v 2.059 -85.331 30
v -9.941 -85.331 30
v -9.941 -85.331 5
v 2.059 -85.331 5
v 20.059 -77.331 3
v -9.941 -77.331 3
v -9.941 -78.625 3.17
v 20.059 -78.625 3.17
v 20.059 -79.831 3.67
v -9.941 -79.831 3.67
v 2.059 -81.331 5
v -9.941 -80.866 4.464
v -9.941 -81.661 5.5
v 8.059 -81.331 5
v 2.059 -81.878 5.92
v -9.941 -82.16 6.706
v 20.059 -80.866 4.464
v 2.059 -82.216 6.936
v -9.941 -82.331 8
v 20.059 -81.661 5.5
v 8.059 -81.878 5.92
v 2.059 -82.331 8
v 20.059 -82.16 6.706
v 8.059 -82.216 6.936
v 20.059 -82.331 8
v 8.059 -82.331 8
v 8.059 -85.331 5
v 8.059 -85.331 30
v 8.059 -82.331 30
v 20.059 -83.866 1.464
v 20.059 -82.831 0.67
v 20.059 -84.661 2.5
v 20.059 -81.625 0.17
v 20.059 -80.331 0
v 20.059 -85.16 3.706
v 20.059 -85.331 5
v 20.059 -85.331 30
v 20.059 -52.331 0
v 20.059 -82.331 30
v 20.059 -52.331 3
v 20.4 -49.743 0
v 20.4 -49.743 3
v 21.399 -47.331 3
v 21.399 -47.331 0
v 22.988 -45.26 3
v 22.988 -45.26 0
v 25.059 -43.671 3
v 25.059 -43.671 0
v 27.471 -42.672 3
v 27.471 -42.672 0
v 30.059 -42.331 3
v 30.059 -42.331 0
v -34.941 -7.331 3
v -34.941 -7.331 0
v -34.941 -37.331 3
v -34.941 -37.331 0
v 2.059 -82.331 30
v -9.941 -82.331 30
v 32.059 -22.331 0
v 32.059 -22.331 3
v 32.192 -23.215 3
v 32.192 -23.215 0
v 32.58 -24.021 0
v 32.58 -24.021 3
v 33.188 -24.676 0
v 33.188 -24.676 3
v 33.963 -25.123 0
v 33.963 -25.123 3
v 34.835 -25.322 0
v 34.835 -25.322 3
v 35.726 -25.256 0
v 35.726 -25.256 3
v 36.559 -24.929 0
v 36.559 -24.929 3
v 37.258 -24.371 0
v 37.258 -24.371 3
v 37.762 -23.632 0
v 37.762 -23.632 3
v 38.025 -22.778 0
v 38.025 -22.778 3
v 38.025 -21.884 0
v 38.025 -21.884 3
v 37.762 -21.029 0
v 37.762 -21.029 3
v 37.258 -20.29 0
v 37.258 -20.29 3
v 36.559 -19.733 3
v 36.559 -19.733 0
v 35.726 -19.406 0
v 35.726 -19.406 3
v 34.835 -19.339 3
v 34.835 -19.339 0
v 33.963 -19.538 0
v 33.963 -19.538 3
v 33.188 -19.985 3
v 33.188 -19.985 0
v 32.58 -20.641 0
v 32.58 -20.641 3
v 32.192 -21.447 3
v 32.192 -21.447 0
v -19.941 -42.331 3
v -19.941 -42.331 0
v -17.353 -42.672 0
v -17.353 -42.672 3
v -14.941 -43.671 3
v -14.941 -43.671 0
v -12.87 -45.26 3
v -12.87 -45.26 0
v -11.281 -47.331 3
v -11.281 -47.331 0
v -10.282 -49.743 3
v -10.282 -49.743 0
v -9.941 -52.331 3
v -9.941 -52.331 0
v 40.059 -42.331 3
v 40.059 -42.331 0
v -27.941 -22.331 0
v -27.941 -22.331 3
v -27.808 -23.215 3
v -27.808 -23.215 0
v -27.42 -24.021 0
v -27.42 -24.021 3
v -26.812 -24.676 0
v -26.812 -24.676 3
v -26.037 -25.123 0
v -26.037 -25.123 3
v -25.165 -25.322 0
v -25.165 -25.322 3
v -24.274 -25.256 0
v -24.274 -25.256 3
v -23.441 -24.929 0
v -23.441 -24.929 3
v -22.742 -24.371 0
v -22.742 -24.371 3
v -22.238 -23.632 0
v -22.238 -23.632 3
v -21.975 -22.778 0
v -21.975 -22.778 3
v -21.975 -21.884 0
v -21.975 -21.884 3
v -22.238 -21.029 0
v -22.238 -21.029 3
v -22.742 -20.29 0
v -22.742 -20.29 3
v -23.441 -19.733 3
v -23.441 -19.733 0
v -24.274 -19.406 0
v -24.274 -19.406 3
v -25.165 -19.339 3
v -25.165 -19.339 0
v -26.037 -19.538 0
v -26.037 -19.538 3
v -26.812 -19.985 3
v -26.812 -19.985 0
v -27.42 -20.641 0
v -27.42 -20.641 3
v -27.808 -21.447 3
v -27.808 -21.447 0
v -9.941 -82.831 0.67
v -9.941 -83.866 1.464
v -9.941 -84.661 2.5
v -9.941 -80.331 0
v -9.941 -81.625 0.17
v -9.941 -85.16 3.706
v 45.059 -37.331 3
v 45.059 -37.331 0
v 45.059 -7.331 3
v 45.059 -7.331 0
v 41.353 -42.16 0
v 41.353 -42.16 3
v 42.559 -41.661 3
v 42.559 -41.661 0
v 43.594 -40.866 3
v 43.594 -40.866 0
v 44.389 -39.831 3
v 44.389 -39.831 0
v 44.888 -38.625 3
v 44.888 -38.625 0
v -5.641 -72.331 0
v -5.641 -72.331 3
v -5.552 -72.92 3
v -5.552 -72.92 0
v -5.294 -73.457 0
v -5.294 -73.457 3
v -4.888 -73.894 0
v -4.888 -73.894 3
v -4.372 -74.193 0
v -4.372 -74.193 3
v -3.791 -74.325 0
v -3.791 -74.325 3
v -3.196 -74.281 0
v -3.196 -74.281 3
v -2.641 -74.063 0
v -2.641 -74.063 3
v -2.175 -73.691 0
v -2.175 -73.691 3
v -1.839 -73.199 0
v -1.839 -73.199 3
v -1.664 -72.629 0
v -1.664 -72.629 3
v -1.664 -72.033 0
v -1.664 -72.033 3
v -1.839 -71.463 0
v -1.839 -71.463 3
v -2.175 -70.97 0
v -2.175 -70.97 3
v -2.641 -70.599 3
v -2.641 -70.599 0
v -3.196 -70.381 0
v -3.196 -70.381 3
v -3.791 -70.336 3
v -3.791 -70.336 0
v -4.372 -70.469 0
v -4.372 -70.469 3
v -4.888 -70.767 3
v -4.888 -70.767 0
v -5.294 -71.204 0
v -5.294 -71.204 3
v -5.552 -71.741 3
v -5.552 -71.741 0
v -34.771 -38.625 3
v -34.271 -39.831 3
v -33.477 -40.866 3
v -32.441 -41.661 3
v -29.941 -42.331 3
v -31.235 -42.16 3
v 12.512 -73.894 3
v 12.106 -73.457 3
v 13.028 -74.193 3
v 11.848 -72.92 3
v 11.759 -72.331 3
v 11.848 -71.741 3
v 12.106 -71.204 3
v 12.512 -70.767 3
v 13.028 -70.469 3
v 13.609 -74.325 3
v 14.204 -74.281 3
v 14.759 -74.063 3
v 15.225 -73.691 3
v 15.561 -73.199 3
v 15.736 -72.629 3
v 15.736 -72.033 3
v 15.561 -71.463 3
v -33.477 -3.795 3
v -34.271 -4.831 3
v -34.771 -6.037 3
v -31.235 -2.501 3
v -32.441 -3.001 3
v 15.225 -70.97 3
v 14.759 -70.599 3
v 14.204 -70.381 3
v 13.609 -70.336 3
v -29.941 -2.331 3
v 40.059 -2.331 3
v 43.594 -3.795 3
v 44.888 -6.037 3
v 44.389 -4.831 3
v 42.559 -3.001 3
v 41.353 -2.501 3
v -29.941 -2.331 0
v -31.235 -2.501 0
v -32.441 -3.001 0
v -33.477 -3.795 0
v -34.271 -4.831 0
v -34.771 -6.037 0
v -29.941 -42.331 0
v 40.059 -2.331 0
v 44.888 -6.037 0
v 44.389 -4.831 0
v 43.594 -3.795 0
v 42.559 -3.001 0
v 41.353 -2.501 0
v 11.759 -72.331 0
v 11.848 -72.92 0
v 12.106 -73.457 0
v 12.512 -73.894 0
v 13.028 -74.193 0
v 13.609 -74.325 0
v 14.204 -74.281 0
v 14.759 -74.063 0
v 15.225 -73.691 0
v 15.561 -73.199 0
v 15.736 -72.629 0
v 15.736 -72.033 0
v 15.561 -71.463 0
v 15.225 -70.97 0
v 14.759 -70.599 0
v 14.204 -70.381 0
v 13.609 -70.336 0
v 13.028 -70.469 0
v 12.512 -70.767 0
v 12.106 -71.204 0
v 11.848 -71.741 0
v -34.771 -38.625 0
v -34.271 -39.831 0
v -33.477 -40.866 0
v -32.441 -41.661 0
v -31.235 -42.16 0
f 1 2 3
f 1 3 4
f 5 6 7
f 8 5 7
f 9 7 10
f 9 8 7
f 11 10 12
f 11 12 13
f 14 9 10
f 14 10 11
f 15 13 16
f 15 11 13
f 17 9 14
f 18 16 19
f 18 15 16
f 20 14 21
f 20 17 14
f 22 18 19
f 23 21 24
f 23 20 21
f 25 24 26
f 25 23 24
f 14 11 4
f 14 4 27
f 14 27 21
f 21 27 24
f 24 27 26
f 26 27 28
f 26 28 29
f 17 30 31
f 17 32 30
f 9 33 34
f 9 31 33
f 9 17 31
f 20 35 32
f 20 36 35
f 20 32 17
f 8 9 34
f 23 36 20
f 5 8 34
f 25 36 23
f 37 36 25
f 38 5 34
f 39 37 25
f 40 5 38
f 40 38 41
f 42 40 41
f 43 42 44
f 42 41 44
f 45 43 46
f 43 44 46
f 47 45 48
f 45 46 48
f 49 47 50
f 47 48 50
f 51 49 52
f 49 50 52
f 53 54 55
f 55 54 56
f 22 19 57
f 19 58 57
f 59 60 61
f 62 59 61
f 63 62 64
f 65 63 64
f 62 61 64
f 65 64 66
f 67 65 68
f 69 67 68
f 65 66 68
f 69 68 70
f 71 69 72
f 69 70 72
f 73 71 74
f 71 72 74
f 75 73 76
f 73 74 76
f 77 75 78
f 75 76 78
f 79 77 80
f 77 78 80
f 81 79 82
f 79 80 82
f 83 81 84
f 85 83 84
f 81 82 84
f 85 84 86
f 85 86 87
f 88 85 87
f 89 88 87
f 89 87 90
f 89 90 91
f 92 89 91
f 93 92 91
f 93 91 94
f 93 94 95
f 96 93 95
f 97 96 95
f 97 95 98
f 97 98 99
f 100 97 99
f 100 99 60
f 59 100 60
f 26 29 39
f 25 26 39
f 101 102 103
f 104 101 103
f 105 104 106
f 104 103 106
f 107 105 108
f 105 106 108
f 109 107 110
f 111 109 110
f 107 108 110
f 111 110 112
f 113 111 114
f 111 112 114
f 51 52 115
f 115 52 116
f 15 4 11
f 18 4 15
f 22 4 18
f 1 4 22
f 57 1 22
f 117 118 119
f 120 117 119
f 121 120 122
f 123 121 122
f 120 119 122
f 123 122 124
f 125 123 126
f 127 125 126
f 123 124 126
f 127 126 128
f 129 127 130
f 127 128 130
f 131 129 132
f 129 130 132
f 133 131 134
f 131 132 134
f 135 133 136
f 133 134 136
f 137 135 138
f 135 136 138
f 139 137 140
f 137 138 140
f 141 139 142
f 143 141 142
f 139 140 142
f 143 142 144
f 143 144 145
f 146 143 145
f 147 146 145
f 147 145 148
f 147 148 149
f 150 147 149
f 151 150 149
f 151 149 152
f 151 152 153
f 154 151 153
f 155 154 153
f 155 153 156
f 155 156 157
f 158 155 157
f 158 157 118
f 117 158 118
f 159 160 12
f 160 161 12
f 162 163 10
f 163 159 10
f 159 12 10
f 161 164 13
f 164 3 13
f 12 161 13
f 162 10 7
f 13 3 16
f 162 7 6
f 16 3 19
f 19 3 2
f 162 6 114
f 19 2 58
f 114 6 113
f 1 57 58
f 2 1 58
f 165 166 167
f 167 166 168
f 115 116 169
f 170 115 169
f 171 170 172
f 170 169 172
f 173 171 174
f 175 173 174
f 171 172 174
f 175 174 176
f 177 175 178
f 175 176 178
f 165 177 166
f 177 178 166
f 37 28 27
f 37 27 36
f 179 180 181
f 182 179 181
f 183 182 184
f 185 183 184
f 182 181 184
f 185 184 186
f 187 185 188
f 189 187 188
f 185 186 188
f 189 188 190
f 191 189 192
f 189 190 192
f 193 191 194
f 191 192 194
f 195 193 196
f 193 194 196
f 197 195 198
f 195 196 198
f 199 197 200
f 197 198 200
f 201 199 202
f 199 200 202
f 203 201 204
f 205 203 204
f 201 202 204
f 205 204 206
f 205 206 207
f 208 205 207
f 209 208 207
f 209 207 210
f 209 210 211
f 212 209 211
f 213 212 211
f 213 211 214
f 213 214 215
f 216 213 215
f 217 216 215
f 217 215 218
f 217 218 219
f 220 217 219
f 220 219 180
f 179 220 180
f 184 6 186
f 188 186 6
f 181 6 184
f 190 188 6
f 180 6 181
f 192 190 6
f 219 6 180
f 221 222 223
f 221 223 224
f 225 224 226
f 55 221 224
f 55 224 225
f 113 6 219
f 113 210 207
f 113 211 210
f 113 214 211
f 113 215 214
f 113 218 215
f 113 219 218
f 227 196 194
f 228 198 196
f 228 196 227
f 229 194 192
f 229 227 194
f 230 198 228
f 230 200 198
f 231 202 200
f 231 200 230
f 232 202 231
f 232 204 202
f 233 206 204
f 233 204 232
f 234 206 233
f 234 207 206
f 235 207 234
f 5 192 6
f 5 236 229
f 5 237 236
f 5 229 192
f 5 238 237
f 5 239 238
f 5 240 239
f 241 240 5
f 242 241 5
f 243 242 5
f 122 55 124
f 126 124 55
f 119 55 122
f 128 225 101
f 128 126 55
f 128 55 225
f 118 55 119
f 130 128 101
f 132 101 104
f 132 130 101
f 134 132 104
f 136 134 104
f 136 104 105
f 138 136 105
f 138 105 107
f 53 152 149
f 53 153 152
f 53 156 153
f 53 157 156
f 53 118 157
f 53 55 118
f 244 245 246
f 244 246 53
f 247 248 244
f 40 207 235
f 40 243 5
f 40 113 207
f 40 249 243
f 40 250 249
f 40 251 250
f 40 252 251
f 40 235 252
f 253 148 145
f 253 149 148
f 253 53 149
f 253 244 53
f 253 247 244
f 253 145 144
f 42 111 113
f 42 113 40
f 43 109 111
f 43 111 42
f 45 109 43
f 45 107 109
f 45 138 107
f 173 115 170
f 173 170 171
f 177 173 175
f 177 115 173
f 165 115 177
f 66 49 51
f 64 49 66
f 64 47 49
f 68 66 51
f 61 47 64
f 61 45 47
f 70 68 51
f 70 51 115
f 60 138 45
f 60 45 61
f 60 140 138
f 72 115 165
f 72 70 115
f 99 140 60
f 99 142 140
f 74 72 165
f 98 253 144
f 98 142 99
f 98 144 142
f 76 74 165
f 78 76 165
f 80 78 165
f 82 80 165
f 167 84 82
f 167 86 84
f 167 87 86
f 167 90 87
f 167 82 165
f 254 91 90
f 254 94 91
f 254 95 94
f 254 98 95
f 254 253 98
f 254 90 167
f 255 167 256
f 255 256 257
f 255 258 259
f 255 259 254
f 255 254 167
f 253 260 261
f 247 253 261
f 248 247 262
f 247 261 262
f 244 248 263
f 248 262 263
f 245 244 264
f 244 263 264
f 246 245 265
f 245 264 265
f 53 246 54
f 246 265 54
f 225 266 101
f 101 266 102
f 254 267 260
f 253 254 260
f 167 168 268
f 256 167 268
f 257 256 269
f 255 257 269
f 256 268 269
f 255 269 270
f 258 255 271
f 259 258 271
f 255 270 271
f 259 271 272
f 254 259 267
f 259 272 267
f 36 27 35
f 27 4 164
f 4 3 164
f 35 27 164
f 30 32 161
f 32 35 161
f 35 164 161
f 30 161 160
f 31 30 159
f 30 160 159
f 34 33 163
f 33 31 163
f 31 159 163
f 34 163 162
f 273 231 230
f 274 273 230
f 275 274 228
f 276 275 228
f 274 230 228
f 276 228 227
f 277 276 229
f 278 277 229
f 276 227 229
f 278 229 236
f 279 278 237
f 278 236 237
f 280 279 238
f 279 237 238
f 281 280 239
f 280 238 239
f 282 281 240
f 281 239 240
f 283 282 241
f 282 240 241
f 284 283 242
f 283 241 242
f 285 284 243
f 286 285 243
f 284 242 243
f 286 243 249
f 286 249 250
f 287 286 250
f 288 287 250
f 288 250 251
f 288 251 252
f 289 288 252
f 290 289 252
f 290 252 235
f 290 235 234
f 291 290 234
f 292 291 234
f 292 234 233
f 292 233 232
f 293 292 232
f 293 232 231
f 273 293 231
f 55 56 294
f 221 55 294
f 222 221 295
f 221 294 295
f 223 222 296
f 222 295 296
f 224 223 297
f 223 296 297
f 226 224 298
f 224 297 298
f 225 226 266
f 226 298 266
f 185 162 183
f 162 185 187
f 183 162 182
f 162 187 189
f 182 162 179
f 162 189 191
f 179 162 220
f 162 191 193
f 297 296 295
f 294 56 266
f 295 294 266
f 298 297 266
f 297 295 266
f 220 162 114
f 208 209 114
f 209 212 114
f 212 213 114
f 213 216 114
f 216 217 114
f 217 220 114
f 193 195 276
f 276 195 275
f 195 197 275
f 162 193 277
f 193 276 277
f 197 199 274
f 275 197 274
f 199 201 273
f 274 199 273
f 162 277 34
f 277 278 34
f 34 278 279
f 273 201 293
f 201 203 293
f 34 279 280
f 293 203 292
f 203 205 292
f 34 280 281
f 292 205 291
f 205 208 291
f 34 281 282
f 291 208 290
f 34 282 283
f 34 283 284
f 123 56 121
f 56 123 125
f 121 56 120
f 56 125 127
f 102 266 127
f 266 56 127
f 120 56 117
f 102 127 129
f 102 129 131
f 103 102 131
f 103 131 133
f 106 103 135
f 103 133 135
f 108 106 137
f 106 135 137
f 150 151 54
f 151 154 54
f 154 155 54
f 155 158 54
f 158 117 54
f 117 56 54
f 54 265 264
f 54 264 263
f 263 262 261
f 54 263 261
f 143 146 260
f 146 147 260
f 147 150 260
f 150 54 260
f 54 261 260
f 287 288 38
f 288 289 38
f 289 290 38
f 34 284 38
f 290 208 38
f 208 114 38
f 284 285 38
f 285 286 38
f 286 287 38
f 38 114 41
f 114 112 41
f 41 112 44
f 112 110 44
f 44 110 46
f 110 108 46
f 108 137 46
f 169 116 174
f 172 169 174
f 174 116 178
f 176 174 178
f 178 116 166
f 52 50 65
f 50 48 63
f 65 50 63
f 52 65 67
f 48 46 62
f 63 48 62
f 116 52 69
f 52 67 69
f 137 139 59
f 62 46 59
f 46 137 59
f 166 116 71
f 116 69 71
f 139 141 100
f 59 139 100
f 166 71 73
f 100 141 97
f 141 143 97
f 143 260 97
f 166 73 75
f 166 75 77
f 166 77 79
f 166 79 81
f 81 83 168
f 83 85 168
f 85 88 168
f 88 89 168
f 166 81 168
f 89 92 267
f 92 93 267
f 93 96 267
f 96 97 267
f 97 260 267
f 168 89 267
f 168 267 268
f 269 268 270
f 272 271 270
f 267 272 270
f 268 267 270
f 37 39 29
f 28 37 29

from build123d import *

# Parameters (mm, degrees)
F1_DEPTH     = 3
F2_D         = 4
F3_D         = 6
F5_W         = 30
F5_H         = 3
F6_DEPTH     = 3
F7_T4_DEPTH  = 30
F7_T10_DEPTH = 30
F7_T16_DEPTH = 30
F7_T23_DEPTH = 30
F7_T29_DEPTH = 30
F7_T32_DEPTH = 55


# Not quite as in the source:
# - a fillet or chamfer that OpenCascade refuses, or shapes differently, is made with other operations: its cross-section is extruded or revolved along the edge and cut away or added


with BuildPart() as f1:
    # F0 (on Top) → F1 (new body)
    with BuildSketch(Plane.XY):
        with BuildLine():
            Line((40.0588317961, -2.3308048306), (-29.9411682039, -2.3308048306))
            ThreePointArc((-29.9411682039, -2.3308048306), (-33.4767021099, -3.7952709247), (-34.9411682039, -7.3308048306))
            Line((-34.9411682039, -7.3308048306), (-34.9411682039, -37.3308048306))
            ThreePointArc((-34.9411682039, -37.3308048306), (-33.4767021099, -40.8663387365), (-29.9411682039, -42.3308048306))
            Line((-29.9411682039, -42.3308048306), (-19.9411682039, -42.3308048306))
            ThreePointArc((-19.9411682039, -42.3308048306), (-12.8701003921, -45.2597370187), (-9.9411682039, -52.3308048306))
            Line((-9.9411682039, -52.3308048306), (-9.9411682039, -82.3308048306))
            Line((-9.9411682039, -82.3308048306), (5.0588317961, -82.3308048306))
            Line((5.0588317961, -82.3308048306), (20.0588317961, -82.3308048306))
            Line((20.0588317961, -82.3308048306), (20.0588317961, -52.3308048306))
            ThreePointArc((20.0588317961, -52.3308048306), (22.9877639842, -45.2597370187), (30.0588317961, -42.3308048306))
            Line((30.0588317961, -42.3308048306), (40.0588317961, -42.3308048306))
            ThreePointArc((40.0588317961, -42.3308048306), (43.594365702, -40.8663387365), (45.0588317961, -37.3308048306))
            Line((45.0588317961, -37.3308048306), (45.0588317961, -7.3308048306))
            ThreePointArc((45.0588317961, -7.3308048306), (43.594365702, -3.7952709247), (40.0588317961, -2.3308048306))
        make_face()
    extrude(amount=F1_DEPTH)

    # F2 (through all)
    with Locations(Plane(origin=(0, 0, 0), x_dir=(1, 0, 0), z_dir=(0, 0, -1))):
        with Locations((-3.6411682039, 72.3308048306), (13.7588317961, 72.3308048306)):
            Hole(F2_D / 2)

    # F3 (through all)
    with Locations(Plane(origin=(0, 0, 0), x_dir=(1, 0, 0), z_dir=(0, 0, -1))):
        with Locations((-24.9411682039, 22.3308048306), (35.0588317961, 22.3308048306)):
            Hole(F3_D / 2)

    # F5 (on face) → F6 (join)
    with BuildSketch(Plane.XZ.offset(82.3308048306)):
        Polygon((-9.9411682039, 30), (-9.9411682039, 3), (20.0588317961, 3), (20.0588317961, 30), (8.0588317961, 30), (8.0588317961, 5), (2.0588317961, 5), (2.0588317961, 30), align=None)
        with Locations((5.0588317961, 1.5)):
            Rectangle(F5_W, F5_H)
    extrude(amount=F6_DEPTH)

    # F7: fillet of radius 5 on 2 edges, made by hand


with BuildPart() as f7_tool2:
    # F7_s3 → F7_t4 (new body)
    with BuildSketch(Plane.YZ.offset(20.0588317961)):
        with BuildLine():
            ThreePointArc((-77.3308048306, 3), (-80.8663387365, 4.4644660941), (-82.3308048306, 8))
            Line((-82.3308048306, 8), (-82.3308048306, 3))
            Line((-82.3308048306, 3), (-77.3308048306, 3))
        make_face()
    extrude(amount=-F7_T4_DEPTH)

    split(bisect_by=Plane.XY.offset(5), keep=Keep.BOTTOM)

    split(bisect_by=Plane.YZ.offset(8.0588317961), keep=Keep.TOP)


with BuildPart() as f1_1:
    add(f1.part)

    # F7_t1: union F7_tool2
    add(f7_tool2.part)


with BuildPart() as f7_tool8:
    # F7_s9 → F7_t10 (new body)
    with BuildSketch(Plane.YZ.offset(20.0588317961)):
        with BuildLine():
            ThreePointArc((-77.3308048306, 3), (-80.8663387365, 4.4644660941), (-82.3308048306, 8))
            Line((-82.3308048306, 8), (-82.3308048306, 3))
            Line((-82.3308048306, 3), (-77.3308048306, 3))
        make_face()
    extrude(amount=-F7_T10_DEPTH)

    split(bisect_by=Plane.XY.offset(5), keep=Keep.TOP)

    split(bisect_by=Plane.YZ.offset(8.0588317961), keep=Keep.TOP)


with BuildPart() as f1_2:
    add(f1_1.part)

    # F7_t7: union F7_tool8
    add(f7_tool8.part)


with BuildPart() as f7_tool14:
    # F7_s15 → F7_t16 (new body)
    with BuildSketch(Plane.YZ.offset(20.0588317961)):
        with BuildLine():
            ThreePointArc((-77.3308048306, 3), (-80.8663387365, 4.4644660941), (-82.3308048306, 8))
            Line((-82.3308048306, 8), (-82.3308048306, 3))
            Line((-82.3308048306, 3), (-77.3308048306, 3))
        make_face()
    extrude(amount=-F7_T16_DEPTH)

    split(bisect_by=Plane.YZ.offset(2.0588317961), keep=Keep.TOP)

    split(bisect_by=Plane.XY.offset(5), keep=Keep.BOTTOM)

    split(bisect_by=Plane.YZ.offset(8.0588317961), keep=Keep.BOTTOM)


with BuildPart() as f1_3:
    add(f1_2.part)

    # F7_t13: union F7_tool14
    add(f7_tool14.part)


with BuildPart() as f7_tool21:
    # F7_s22 → F7_t23 (new body)
    with BuildSketch(Plane.YZ.offset(20.0588317961)):
        with BuildLine():
            ThreePointArc((-77.3308048306, 3), (-80.8663387365, 4.4644660941), (-82.3308048306, 8))
            Line((-82.3308048306, 8), (-82.3308048306, 3))
            Line((-82.3308048306, 3), (-77.3308048306, 3))
        make_face()
    extrude(amount=-F7_T23_DEPTH)

    split(bisect_by=Plane.YZ.offset(2.0588317961), keep=Keep.BOTTOM)

    split(bisect_by=Plane.XY.offset(5), keep=Keep.BOTTOM)


with BuildPart() as f1_4:
    add(f1_3.part)

    # F7_t20: union F7_tool21
    add(f7_tool21.part)


with BuildPart() as f7_tool27:
    # F7_s28 → F7_t29 (new body)
    with BuildSketch(Plane.YZ.offset(20.0588317961)):
        with BuildLine():
            ThreePointArc((-77.3308048306, 3), (-80.8663387365, 4.4644660941), (-82.3308048306, 8))
            Line((-82.3308048306, 8), (-82.3308048306, 3))
            Line((-82.3308048306, 3), (-77.3308048306, 3))
        make_face()
    extrude(amount=-F7_T29_DEPTH)

    split(bisect_by=Plane.YZ.offset(2.0588317961), keep=Keep.BOTTOM)

    split(bisect_by=Plane.XY.offset(5), keep=Keep.TOP)


with BuildPart() as f1_5:
    add(f1_4.part)

    # F7_t26: union F7_tool27
    add(f7_tool27.part)

    # F7_s33 → F7_t32 (cut)
    with BuildSketch(Plane.YZ.offset(-22.4411682039)):
        with BuildLine():
            ThreePointArc((-85.3308048306, 5), (-83.8663387365, 1.4644660941), (-80.3308048306, 0))
            Line((-80.3308048306, 0), (-85.3308048306, 0))
            Line((-85.3308048306, 0), (-85.3308048306, 5))
        make_face()
    extrude(amount=F7_T32_DEPTH, mode=Mode.SUBTRACT)


solid = f1_5.part
